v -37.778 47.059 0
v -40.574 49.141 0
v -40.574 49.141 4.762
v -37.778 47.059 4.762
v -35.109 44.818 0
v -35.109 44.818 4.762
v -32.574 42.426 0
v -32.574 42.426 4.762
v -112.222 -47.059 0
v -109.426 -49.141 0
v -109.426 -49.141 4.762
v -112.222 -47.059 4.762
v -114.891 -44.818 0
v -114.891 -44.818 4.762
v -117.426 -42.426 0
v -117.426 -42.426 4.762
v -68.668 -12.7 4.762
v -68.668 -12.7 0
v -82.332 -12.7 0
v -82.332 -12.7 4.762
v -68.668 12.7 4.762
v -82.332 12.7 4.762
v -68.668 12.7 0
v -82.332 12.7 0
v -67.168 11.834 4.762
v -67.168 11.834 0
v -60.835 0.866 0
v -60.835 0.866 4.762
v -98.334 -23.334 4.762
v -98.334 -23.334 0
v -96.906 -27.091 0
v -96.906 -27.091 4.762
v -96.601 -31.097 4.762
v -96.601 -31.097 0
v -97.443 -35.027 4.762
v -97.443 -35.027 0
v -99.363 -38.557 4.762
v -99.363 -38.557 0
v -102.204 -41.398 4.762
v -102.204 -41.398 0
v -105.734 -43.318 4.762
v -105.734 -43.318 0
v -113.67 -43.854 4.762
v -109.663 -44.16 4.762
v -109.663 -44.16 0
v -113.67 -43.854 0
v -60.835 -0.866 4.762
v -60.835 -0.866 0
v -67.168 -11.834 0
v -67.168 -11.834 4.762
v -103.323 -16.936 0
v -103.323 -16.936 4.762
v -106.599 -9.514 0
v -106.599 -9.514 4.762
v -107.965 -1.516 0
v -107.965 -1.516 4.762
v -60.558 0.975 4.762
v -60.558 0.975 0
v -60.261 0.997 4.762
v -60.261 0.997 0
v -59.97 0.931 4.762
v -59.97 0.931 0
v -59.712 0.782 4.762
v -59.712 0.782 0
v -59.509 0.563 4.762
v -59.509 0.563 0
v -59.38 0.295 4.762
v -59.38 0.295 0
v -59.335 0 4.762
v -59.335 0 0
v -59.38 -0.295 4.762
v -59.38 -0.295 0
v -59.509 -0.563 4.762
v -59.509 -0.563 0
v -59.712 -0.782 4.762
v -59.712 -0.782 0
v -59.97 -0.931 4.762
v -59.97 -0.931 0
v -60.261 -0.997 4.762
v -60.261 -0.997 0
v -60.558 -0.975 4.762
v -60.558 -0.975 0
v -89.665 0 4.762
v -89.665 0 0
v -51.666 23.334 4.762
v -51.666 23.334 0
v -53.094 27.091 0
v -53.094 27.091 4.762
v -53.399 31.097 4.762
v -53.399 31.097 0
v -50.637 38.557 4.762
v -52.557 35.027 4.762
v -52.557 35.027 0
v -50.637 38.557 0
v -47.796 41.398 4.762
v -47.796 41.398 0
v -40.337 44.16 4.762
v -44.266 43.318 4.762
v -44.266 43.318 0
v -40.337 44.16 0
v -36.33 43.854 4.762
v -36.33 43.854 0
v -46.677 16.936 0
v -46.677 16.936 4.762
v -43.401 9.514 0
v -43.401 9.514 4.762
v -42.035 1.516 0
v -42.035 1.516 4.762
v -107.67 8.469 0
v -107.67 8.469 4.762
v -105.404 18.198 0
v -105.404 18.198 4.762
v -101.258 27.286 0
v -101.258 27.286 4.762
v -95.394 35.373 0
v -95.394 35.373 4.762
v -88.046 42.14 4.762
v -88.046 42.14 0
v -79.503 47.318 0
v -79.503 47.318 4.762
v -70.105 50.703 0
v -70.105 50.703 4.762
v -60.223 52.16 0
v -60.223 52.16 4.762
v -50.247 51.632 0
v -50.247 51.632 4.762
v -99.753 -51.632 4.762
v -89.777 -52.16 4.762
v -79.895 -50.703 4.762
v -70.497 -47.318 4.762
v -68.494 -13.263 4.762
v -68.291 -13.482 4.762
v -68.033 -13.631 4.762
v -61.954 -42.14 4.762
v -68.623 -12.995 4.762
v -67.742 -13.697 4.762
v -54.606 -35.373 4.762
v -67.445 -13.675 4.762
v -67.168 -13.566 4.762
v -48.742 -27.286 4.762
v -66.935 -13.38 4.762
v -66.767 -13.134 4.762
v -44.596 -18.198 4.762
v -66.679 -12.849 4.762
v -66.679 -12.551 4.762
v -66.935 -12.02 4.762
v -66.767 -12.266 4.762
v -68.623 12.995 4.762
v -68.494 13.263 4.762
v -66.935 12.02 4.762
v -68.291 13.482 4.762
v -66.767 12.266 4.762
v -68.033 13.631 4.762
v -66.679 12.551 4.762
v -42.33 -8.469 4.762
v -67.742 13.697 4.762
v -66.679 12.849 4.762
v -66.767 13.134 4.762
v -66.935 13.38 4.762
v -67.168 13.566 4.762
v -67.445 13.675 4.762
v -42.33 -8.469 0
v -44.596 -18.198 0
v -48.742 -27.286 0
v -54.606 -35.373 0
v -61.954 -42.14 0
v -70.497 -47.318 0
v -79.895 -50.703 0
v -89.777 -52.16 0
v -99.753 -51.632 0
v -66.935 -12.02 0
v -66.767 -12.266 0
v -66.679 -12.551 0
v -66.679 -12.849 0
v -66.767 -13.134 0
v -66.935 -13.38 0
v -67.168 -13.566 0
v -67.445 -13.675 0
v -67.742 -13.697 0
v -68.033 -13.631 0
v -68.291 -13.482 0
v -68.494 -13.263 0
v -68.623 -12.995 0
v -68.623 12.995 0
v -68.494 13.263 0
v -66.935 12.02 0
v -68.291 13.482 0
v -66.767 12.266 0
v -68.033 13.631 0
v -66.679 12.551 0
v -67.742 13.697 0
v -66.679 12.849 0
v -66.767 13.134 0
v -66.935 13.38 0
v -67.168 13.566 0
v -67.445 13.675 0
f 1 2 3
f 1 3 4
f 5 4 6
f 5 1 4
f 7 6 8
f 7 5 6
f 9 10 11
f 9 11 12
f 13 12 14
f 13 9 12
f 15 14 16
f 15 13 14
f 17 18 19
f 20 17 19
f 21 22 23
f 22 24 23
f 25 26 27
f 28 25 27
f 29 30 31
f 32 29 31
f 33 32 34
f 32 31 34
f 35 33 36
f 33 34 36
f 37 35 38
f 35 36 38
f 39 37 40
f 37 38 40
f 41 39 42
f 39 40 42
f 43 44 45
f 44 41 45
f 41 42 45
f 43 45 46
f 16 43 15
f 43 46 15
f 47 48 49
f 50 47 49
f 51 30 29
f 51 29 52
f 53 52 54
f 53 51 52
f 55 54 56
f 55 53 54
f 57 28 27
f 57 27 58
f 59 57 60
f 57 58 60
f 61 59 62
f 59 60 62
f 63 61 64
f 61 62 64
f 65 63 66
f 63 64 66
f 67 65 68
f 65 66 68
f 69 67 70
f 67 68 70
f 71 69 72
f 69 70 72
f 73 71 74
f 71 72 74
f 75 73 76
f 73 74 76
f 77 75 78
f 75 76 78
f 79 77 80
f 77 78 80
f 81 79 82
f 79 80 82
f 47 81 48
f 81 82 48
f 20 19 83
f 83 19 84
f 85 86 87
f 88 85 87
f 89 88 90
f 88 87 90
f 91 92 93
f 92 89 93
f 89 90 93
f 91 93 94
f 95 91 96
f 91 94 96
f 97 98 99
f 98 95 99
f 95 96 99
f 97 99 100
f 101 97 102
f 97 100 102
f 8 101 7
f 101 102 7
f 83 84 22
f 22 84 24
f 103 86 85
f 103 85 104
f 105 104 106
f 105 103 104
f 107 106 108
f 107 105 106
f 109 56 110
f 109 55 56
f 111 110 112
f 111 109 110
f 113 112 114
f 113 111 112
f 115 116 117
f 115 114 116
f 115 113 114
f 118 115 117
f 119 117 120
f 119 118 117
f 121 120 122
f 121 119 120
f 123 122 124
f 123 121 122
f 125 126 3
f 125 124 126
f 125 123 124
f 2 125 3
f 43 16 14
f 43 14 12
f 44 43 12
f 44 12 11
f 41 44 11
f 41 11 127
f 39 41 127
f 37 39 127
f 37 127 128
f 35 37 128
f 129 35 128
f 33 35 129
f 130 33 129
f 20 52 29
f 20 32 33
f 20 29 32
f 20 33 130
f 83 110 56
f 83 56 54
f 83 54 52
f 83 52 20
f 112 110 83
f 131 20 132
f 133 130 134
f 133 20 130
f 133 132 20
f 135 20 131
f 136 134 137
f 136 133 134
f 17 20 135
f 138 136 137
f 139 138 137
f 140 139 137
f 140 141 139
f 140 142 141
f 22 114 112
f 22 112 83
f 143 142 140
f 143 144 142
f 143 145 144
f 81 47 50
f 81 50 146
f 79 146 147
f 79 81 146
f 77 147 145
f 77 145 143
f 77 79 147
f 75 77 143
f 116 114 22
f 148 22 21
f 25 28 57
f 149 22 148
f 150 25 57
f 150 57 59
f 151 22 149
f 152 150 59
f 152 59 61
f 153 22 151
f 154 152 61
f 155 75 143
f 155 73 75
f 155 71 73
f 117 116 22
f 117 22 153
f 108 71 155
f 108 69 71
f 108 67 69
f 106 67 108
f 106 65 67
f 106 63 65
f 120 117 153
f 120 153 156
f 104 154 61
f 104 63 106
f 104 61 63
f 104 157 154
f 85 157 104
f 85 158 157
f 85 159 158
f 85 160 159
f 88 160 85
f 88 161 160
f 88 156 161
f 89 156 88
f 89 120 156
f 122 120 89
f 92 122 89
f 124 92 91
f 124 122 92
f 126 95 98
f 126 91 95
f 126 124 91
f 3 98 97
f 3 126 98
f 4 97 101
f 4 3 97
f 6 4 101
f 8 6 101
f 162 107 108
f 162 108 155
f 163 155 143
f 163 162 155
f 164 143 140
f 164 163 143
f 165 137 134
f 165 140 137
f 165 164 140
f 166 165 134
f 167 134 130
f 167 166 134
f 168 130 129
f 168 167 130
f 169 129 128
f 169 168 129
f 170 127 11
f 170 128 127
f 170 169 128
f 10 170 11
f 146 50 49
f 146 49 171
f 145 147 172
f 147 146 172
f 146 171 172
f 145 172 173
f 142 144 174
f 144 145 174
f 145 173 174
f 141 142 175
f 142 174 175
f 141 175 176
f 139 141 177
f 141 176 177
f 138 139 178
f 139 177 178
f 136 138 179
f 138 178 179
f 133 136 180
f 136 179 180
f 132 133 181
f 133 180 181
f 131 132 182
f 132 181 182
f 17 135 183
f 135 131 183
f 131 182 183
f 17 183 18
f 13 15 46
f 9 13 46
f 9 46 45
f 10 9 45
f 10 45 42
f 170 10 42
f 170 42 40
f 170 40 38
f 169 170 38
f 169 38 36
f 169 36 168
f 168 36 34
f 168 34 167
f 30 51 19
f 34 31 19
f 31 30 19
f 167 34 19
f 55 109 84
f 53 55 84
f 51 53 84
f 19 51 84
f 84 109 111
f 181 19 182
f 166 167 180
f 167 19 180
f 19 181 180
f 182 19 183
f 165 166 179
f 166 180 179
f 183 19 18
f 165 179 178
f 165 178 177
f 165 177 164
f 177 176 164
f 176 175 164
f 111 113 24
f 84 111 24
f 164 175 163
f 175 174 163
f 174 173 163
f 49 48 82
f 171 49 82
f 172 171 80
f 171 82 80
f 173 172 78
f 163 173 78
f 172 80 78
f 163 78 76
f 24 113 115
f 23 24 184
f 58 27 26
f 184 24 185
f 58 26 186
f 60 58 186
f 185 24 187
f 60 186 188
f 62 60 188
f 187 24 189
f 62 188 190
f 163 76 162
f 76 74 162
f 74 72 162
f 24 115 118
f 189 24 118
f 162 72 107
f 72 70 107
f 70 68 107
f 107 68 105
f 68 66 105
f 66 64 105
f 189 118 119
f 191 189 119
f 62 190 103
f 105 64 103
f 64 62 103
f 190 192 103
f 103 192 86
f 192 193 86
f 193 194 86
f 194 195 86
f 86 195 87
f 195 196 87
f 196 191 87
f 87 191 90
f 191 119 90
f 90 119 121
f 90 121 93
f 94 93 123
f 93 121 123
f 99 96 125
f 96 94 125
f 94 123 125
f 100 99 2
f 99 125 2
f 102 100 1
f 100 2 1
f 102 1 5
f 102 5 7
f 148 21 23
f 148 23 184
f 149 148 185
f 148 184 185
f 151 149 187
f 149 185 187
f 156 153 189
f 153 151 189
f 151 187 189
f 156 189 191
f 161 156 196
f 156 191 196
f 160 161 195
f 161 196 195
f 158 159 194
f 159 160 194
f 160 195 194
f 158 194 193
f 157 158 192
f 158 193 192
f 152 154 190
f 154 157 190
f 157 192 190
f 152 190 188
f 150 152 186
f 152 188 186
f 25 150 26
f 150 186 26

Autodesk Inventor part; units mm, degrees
ref_plane "YZ Plane" through (0, 0, 0) normal (1, 0, 0) x (0, 1, 0)
ref_plane "XZ Plane" through (0, 0, 0) normal (0, 1, 0) x (-1, 0, 0)
ref_plane "XY Plane" through (0, 0, 0) normal (0, 0, 1) x (1, 0, 0)
sketch "Sketch1" plane through (0, 0, 0) normal (0, 0, 1) x (1, 0, 0)
  arc A0 (-107.9651, -1.5164) -> (-98.3345, -23.3345) centre (-75, 0) ccw
  arc A1 (-40.5736, 49.1408) -> (-107.9651, -1.5164) centre (-57.8736, 2.0002) ccw
  arc A2 (-32.5736, 42.4264) -> (-40.5736, 49.1408) centre (-75, 0) ccw
  arc A3 (-32.5736, 42.4264) -> (-51.6655, 23.3345) centre (-39.3901, 30.151) ccw
  arc A4 (-42.0349, 1.5164) -> (-51.6655, 23.3345) centre (-75, 0) ccw
  arc A5 (-109.4264, -49.1408) -> (-42.0349, 1.5164) centre (-92.1264, -2.0002) ccw
  arc A6 (-117.4264, -42.4264) -> (-109.4264, -49.1408) centre (-75, 0) ccw
  arc A7 (-117.4264, -42.4264) -> (-98.3345, -23.3345) centre (-110.6099, -30.151) ccw
  arc A8 (-32.5736, 42.4264) -> (-40.5736, 49.1408) centre (-75, 0) ccw
  arc A9 (-40.5736, 49.1408) -> (-107.9651, -1.5164) centre (-57.8736, 2.0002) ccw
  arc A10 (-107.9651, -1.5164) -> (-98.3345, -23.3345) centre (-75, 0) ccw
  arc A11 (-117.4264, -42.4264) -> (-98.3345, -23.3345) centre (-110.6099, -30.151) ccw
  arc A12 (-117.4264, -42.4264) -> (-109.4264, -49.1408) centre (-75, 0) ccw
  arc A13 (-109.4264, -49.1408) -> (-42.0349, 1.5164) centre (-92.1264, -2.0002) ccw
  arc A14 (-42.0349, 1.5164) -> (-51.6655, 23.3345) centre (-75, 0) ccw
  arc A15 (-32.5736, 42.4264) -> (-51.6655, 23.3345) centre (-39.3901, 30.151) ccw
  line L0 (-82.3323, -12.7) -> (-89.6647, 0)
  line L1 (-89.6647, 0) -> (-82.3323, 12.7)
  line L2 (-82.3323, 12.7) -> (-68.6677, 12.7)
  arc A16 (-67.1677, 11.834) -> (-68.6677, 12.7) centre (-67.6677, 12.7) ccw
  line L3 (-67.1677, 11.834) -> (-60.8353, 0.866)
  arc A17 (-60.8353, -0.866) -> (-60.8353, 0.866) centre (-60.3353, 0) ccw
  line L4 (-60.8353, -0.866) -> (-67.1677, -11.834)
  arc A18 (-68.6677, -12.7) -> (-67.1677, -11.834) centre (-67.6677, -12.7) ccw
  line L5 (-68.6677, -12.7) -> (-82.3323, -12.7)
  point P0 (0, 0)
extrude "Extrusion1" add sketch "Sketch1" along normal blind 4.7625
properties part number "3-16inch_Knife3_Piece1"
